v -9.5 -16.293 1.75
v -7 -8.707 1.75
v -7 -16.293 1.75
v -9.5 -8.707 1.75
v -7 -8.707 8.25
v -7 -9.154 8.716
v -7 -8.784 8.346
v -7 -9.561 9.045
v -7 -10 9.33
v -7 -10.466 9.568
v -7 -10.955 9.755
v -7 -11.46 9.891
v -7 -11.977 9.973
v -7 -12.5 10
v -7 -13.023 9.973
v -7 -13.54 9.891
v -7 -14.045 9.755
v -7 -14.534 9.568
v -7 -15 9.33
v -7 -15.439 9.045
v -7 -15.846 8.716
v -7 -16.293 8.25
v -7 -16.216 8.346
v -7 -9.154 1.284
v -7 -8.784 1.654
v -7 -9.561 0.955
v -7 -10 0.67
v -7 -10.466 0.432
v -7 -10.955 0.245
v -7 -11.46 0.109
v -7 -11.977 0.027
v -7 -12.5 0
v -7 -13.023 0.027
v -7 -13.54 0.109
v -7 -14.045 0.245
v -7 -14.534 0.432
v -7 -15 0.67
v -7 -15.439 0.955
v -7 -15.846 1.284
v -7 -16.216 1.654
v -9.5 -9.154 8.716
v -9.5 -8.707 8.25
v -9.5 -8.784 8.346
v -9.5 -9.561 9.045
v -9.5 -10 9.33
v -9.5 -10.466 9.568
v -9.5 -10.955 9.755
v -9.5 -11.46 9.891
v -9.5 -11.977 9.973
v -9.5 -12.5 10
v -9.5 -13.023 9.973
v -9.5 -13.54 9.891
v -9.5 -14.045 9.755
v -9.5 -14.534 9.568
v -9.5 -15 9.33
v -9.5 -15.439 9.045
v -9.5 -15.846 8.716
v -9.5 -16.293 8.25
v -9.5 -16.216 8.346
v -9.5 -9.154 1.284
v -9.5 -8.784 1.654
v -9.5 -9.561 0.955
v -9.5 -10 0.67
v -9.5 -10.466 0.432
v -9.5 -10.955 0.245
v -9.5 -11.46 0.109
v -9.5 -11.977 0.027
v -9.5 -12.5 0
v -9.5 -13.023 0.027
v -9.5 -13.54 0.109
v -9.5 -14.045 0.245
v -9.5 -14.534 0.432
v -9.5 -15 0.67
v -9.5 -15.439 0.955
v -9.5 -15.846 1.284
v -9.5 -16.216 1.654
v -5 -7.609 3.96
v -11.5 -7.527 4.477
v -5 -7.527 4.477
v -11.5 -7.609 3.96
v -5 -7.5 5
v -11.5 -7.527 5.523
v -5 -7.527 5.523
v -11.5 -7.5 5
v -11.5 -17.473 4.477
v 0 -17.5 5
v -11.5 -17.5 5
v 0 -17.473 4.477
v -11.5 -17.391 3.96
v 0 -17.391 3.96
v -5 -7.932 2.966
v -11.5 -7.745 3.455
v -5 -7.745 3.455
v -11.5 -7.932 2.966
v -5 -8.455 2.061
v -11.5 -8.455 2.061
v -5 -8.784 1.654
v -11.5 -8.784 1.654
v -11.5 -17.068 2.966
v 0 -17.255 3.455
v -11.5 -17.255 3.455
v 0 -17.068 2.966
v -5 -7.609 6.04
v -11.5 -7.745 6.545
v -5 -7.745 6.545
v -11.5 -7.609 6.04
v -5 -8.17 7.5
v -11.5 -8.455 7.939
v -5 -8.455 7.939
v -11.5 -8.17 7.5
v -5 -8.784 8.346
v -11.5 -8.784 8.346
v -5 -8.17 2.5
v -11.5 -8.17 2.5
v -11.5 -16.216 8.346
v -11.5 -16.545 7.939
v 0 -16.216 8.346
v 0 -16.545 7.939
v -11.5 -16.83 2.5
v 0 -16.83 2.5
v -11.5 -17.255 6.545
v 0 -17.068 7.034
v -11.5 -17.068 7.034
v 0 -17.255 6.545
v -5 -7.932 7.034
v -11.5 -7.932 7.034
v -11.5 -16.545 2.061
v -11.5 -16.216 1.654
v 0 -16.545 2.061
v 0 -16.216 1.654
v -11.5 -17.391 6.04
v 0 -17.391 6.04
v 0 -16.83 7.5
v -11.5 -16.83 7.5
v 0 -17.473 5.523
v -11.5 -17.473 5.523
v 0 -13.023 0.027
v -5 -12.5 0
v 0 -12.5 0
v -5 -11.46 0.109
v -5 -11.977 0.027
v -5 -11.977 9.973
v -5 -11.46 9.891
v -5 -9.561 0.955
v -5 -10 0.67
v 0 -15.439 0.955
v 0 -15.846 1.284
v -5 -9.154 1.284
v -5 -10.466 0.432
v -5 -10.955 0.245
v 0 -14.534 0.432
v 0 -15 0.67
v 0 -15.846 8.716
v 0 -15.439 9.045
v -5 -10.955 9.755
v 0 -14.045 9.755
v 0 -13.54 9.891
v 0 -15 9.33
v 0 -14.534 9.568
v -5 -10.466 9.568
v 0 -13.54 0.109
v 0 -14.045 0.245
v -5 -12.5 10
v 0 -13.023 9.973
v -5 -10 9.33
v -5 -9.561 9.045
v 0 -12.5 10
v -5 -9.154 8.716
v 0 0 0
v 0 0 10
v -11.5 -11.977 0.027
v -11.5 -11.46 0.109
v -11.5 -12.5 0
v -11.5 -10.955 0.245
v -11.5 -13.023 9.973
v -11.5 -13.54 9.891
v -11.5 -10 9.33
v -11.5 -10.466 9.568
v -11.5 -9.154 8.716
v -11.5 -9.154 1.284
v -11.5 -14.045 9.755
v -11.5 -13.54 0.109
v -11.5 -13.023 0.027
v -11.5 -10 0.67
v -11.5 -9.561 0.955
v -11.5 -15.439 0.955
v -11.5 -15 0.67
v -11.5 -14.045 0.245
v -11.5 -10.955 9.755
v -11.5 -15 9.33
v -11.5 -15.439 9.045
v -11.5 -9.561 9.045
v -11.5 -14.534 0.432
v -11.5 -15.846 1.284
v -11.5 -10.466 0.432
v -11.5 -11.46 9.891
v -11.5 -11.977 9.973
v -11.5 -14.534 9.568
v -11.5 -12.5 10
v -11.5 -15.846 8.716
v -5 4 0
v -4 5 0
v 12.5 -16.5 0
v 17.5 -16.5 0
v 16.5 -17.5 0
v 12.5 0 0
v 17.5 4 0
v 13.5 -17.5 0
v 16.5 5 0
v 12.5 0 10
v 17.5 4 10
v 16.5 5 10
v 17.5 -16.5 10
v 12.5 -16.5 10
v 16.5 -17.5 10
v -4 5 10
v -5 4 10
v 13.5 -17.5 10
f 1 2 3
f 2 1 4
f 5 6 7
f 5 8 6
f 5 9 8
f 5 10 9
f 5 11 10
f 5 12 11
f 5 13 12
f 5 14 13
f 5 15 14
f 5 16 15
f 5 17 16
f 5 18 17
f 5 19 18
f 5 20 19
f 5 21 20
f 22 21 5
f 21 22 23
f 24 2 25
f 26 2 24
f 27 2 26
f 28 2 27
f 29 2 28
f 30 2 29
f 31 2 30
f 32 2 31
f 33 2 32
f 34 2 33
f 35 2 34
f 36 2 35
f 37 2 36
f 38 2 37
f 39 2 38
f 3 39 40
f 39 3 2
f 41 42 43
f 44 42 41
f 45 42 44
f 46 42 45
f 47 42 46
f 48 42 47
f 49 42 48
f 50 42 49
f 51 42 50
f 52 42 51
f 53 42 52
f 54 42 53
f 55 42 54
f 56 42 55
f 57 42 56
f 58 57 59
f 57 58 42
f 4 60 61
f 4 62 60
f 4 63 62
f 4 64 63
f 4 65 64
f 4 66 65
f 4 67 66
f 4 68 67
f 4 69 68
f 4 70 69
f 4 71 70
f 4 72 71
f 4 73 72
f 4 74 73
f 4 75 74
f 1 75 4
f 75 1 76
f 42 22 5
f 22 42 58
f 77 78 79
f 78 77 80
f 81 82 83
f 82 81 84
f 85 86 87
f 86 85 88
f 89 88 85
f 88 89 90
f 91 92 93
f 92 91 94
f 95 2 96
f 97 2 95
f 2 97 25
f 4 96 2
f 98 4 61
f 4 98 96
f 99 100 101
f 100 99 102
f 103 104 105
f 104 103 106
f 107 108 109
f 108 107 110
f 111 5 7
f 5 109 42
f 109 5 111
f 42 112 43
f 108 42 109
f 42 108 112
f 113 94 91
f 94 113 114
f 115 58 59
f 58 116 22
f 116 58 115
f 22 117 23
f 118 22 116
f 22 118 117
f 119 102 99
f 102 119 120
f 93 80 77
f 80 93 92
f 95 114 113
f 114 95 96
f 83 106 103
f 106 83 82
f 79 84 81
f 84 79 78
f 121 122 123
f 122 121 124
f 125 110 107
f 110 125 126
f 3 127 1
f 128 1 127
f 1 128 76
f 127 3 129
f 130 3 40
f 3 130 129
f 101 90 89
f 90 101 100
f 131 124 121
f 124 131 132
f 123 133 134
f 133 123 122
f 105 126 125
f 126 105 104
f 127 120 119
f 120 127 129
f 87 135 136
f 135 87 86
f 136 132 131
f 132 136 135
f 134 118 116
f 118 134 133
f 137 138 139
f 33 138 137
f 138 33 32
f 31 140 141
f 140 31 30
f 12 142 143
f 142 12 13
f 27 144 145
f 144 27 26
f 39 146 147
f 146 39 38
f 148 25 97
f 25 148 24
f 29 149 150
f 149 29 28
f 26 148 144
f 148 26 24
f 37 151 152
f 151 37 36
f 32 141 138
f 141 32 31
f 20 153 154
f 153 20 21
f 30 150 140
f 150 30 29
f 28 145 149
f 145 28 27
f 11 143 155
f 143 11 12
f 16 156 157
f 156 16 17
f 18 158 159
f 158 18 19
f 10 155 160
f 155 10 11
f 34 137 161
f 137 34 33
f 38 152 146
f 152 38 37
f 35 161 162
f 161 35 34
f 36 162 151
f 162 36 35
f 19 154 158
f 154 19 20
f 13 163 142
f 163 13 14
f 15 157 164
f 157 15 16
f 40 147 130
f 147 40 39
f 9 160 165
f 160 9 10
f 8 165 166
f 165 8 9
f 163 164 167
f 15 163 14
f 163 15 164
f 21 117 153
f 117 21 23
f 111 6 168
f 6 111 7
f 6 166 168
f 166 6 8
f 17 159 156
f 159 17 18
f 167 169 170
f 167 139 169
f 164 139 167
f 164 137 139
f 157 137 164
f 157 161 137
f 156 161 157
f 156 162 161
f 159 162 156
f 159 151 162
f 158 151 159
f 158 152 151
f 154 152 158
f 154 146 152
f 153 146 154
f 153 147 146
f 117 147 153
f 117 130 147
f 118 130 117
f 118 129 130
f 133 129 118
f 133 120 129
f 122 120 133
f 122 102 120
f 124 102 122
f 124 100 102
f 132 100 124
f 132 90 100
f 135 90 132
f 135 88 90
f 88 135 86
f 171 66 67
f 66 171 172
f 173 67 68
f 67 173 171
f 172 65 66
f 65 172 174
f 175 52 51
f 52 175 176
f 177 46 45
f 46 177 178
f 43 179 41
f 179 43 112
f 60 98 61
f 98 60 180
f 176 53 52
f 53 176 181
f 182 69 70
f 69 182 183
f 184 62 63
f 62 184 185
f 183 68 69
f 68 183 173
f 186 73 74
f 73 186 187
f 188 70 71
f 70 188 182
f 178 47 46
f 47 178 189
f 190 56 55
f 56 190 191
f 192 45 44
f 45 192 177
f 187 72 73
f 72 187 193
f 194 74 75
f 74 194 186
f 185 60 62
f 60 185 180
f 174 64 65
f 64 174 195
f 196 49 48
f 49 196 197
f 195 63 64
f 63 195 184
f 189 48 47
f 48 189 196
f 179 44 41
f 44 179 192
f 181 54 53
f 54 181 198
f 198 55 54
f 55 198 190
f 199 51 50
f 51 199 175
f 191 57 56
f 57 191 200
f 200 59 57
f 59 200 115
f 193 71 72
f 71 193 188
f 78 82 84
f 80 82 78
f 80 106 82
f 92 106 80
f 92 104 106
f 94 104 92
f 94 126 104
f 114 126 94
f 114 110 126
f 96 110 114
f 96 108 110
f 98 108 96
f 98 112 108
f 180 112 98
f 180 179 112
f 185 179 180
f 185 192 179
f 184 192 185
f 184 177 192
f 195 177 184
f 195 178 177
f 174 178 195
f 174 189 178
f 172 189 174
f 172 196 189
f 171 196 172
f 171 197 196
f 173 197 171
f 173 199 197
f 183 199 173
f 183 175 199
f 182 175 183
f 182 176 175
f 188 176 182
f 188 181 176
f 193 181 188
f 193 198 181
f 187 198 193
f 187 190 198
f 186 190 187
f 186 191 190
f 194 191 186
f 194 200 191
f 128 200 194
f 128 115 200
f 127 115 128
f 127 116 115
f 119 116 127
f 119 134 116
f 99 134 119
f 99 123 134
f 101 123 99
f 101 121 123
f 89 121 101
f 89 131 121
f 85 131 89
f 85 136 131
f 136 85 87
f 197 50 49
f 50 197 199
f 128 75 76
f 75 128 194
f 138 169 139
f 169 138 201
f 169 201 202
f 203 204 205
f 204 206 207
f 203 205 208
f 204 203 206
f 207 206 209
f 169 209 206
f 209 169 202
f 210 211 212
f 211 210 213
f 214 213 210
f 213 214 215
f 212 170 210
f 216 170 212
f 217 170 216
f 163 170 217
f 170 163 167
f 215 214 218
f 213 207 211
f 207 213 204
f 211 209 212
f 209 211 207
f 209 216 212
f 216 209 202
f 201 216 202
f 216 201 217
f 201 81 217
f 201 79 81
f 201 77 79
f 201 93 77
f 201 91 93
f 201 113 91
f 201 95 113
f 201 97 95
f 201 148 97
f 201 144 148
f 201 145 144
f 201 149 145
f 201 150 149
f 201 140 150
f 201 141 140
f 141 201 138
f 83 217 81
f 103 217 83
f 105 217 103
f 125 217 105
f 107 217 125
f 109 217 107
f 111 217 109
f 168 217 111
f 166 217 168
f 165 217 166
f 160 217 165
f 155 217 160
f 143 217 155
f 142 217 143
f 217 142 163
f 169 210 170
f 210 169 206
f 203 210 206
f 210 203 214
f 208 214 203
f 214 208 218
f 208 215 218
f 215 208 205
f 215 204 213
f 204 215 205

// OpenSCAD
TOL = 0.5;
B = 12 + TOL;
H = 18 - TOL;
D = 5;
K_D1 = 10;
K_D2 = 7-TOL;
K_L1 = 2;
K_L2 = 2 + TOL;
K_L3 = 2;
fn = 60;

linear_extrude(10) {
	//polygon([[0,0],[B,0],[B,-H],[B+D,-H],[B+D,D],[-D,D],[-D,-H+D],[0,-H+D]]);
	polygon([[0,0],[B,0],[B,-H+1],[B+1,-H],[B+D-1,-H], [B+D,-H+1],[B+D,D-1],[B+D-1,D],,[-D+1,D], [-D,D-1],[-D,-H+D],[0,-H+D]]);

}

translate([-D-K_L1,-H+D,5])
rotate([0,90,0]) {

	cylinder(h=K_L1+D, r=K_D1/2, $fn = fn);

	intersection() {
		
		translate([-K_D2/2,-K_D1/2,-K_L2])
		cube([K_D2,K_D1,K_L2]);
		
		translate([0,0,-100])
		cylinder(h=200, r=K_D1/2, $fn = fn);
	}
	
	translate([0,0,-K_L1-K_L2])
	cylinder(h=K_L3, r = K_D1/2, $fn=fn);
}
